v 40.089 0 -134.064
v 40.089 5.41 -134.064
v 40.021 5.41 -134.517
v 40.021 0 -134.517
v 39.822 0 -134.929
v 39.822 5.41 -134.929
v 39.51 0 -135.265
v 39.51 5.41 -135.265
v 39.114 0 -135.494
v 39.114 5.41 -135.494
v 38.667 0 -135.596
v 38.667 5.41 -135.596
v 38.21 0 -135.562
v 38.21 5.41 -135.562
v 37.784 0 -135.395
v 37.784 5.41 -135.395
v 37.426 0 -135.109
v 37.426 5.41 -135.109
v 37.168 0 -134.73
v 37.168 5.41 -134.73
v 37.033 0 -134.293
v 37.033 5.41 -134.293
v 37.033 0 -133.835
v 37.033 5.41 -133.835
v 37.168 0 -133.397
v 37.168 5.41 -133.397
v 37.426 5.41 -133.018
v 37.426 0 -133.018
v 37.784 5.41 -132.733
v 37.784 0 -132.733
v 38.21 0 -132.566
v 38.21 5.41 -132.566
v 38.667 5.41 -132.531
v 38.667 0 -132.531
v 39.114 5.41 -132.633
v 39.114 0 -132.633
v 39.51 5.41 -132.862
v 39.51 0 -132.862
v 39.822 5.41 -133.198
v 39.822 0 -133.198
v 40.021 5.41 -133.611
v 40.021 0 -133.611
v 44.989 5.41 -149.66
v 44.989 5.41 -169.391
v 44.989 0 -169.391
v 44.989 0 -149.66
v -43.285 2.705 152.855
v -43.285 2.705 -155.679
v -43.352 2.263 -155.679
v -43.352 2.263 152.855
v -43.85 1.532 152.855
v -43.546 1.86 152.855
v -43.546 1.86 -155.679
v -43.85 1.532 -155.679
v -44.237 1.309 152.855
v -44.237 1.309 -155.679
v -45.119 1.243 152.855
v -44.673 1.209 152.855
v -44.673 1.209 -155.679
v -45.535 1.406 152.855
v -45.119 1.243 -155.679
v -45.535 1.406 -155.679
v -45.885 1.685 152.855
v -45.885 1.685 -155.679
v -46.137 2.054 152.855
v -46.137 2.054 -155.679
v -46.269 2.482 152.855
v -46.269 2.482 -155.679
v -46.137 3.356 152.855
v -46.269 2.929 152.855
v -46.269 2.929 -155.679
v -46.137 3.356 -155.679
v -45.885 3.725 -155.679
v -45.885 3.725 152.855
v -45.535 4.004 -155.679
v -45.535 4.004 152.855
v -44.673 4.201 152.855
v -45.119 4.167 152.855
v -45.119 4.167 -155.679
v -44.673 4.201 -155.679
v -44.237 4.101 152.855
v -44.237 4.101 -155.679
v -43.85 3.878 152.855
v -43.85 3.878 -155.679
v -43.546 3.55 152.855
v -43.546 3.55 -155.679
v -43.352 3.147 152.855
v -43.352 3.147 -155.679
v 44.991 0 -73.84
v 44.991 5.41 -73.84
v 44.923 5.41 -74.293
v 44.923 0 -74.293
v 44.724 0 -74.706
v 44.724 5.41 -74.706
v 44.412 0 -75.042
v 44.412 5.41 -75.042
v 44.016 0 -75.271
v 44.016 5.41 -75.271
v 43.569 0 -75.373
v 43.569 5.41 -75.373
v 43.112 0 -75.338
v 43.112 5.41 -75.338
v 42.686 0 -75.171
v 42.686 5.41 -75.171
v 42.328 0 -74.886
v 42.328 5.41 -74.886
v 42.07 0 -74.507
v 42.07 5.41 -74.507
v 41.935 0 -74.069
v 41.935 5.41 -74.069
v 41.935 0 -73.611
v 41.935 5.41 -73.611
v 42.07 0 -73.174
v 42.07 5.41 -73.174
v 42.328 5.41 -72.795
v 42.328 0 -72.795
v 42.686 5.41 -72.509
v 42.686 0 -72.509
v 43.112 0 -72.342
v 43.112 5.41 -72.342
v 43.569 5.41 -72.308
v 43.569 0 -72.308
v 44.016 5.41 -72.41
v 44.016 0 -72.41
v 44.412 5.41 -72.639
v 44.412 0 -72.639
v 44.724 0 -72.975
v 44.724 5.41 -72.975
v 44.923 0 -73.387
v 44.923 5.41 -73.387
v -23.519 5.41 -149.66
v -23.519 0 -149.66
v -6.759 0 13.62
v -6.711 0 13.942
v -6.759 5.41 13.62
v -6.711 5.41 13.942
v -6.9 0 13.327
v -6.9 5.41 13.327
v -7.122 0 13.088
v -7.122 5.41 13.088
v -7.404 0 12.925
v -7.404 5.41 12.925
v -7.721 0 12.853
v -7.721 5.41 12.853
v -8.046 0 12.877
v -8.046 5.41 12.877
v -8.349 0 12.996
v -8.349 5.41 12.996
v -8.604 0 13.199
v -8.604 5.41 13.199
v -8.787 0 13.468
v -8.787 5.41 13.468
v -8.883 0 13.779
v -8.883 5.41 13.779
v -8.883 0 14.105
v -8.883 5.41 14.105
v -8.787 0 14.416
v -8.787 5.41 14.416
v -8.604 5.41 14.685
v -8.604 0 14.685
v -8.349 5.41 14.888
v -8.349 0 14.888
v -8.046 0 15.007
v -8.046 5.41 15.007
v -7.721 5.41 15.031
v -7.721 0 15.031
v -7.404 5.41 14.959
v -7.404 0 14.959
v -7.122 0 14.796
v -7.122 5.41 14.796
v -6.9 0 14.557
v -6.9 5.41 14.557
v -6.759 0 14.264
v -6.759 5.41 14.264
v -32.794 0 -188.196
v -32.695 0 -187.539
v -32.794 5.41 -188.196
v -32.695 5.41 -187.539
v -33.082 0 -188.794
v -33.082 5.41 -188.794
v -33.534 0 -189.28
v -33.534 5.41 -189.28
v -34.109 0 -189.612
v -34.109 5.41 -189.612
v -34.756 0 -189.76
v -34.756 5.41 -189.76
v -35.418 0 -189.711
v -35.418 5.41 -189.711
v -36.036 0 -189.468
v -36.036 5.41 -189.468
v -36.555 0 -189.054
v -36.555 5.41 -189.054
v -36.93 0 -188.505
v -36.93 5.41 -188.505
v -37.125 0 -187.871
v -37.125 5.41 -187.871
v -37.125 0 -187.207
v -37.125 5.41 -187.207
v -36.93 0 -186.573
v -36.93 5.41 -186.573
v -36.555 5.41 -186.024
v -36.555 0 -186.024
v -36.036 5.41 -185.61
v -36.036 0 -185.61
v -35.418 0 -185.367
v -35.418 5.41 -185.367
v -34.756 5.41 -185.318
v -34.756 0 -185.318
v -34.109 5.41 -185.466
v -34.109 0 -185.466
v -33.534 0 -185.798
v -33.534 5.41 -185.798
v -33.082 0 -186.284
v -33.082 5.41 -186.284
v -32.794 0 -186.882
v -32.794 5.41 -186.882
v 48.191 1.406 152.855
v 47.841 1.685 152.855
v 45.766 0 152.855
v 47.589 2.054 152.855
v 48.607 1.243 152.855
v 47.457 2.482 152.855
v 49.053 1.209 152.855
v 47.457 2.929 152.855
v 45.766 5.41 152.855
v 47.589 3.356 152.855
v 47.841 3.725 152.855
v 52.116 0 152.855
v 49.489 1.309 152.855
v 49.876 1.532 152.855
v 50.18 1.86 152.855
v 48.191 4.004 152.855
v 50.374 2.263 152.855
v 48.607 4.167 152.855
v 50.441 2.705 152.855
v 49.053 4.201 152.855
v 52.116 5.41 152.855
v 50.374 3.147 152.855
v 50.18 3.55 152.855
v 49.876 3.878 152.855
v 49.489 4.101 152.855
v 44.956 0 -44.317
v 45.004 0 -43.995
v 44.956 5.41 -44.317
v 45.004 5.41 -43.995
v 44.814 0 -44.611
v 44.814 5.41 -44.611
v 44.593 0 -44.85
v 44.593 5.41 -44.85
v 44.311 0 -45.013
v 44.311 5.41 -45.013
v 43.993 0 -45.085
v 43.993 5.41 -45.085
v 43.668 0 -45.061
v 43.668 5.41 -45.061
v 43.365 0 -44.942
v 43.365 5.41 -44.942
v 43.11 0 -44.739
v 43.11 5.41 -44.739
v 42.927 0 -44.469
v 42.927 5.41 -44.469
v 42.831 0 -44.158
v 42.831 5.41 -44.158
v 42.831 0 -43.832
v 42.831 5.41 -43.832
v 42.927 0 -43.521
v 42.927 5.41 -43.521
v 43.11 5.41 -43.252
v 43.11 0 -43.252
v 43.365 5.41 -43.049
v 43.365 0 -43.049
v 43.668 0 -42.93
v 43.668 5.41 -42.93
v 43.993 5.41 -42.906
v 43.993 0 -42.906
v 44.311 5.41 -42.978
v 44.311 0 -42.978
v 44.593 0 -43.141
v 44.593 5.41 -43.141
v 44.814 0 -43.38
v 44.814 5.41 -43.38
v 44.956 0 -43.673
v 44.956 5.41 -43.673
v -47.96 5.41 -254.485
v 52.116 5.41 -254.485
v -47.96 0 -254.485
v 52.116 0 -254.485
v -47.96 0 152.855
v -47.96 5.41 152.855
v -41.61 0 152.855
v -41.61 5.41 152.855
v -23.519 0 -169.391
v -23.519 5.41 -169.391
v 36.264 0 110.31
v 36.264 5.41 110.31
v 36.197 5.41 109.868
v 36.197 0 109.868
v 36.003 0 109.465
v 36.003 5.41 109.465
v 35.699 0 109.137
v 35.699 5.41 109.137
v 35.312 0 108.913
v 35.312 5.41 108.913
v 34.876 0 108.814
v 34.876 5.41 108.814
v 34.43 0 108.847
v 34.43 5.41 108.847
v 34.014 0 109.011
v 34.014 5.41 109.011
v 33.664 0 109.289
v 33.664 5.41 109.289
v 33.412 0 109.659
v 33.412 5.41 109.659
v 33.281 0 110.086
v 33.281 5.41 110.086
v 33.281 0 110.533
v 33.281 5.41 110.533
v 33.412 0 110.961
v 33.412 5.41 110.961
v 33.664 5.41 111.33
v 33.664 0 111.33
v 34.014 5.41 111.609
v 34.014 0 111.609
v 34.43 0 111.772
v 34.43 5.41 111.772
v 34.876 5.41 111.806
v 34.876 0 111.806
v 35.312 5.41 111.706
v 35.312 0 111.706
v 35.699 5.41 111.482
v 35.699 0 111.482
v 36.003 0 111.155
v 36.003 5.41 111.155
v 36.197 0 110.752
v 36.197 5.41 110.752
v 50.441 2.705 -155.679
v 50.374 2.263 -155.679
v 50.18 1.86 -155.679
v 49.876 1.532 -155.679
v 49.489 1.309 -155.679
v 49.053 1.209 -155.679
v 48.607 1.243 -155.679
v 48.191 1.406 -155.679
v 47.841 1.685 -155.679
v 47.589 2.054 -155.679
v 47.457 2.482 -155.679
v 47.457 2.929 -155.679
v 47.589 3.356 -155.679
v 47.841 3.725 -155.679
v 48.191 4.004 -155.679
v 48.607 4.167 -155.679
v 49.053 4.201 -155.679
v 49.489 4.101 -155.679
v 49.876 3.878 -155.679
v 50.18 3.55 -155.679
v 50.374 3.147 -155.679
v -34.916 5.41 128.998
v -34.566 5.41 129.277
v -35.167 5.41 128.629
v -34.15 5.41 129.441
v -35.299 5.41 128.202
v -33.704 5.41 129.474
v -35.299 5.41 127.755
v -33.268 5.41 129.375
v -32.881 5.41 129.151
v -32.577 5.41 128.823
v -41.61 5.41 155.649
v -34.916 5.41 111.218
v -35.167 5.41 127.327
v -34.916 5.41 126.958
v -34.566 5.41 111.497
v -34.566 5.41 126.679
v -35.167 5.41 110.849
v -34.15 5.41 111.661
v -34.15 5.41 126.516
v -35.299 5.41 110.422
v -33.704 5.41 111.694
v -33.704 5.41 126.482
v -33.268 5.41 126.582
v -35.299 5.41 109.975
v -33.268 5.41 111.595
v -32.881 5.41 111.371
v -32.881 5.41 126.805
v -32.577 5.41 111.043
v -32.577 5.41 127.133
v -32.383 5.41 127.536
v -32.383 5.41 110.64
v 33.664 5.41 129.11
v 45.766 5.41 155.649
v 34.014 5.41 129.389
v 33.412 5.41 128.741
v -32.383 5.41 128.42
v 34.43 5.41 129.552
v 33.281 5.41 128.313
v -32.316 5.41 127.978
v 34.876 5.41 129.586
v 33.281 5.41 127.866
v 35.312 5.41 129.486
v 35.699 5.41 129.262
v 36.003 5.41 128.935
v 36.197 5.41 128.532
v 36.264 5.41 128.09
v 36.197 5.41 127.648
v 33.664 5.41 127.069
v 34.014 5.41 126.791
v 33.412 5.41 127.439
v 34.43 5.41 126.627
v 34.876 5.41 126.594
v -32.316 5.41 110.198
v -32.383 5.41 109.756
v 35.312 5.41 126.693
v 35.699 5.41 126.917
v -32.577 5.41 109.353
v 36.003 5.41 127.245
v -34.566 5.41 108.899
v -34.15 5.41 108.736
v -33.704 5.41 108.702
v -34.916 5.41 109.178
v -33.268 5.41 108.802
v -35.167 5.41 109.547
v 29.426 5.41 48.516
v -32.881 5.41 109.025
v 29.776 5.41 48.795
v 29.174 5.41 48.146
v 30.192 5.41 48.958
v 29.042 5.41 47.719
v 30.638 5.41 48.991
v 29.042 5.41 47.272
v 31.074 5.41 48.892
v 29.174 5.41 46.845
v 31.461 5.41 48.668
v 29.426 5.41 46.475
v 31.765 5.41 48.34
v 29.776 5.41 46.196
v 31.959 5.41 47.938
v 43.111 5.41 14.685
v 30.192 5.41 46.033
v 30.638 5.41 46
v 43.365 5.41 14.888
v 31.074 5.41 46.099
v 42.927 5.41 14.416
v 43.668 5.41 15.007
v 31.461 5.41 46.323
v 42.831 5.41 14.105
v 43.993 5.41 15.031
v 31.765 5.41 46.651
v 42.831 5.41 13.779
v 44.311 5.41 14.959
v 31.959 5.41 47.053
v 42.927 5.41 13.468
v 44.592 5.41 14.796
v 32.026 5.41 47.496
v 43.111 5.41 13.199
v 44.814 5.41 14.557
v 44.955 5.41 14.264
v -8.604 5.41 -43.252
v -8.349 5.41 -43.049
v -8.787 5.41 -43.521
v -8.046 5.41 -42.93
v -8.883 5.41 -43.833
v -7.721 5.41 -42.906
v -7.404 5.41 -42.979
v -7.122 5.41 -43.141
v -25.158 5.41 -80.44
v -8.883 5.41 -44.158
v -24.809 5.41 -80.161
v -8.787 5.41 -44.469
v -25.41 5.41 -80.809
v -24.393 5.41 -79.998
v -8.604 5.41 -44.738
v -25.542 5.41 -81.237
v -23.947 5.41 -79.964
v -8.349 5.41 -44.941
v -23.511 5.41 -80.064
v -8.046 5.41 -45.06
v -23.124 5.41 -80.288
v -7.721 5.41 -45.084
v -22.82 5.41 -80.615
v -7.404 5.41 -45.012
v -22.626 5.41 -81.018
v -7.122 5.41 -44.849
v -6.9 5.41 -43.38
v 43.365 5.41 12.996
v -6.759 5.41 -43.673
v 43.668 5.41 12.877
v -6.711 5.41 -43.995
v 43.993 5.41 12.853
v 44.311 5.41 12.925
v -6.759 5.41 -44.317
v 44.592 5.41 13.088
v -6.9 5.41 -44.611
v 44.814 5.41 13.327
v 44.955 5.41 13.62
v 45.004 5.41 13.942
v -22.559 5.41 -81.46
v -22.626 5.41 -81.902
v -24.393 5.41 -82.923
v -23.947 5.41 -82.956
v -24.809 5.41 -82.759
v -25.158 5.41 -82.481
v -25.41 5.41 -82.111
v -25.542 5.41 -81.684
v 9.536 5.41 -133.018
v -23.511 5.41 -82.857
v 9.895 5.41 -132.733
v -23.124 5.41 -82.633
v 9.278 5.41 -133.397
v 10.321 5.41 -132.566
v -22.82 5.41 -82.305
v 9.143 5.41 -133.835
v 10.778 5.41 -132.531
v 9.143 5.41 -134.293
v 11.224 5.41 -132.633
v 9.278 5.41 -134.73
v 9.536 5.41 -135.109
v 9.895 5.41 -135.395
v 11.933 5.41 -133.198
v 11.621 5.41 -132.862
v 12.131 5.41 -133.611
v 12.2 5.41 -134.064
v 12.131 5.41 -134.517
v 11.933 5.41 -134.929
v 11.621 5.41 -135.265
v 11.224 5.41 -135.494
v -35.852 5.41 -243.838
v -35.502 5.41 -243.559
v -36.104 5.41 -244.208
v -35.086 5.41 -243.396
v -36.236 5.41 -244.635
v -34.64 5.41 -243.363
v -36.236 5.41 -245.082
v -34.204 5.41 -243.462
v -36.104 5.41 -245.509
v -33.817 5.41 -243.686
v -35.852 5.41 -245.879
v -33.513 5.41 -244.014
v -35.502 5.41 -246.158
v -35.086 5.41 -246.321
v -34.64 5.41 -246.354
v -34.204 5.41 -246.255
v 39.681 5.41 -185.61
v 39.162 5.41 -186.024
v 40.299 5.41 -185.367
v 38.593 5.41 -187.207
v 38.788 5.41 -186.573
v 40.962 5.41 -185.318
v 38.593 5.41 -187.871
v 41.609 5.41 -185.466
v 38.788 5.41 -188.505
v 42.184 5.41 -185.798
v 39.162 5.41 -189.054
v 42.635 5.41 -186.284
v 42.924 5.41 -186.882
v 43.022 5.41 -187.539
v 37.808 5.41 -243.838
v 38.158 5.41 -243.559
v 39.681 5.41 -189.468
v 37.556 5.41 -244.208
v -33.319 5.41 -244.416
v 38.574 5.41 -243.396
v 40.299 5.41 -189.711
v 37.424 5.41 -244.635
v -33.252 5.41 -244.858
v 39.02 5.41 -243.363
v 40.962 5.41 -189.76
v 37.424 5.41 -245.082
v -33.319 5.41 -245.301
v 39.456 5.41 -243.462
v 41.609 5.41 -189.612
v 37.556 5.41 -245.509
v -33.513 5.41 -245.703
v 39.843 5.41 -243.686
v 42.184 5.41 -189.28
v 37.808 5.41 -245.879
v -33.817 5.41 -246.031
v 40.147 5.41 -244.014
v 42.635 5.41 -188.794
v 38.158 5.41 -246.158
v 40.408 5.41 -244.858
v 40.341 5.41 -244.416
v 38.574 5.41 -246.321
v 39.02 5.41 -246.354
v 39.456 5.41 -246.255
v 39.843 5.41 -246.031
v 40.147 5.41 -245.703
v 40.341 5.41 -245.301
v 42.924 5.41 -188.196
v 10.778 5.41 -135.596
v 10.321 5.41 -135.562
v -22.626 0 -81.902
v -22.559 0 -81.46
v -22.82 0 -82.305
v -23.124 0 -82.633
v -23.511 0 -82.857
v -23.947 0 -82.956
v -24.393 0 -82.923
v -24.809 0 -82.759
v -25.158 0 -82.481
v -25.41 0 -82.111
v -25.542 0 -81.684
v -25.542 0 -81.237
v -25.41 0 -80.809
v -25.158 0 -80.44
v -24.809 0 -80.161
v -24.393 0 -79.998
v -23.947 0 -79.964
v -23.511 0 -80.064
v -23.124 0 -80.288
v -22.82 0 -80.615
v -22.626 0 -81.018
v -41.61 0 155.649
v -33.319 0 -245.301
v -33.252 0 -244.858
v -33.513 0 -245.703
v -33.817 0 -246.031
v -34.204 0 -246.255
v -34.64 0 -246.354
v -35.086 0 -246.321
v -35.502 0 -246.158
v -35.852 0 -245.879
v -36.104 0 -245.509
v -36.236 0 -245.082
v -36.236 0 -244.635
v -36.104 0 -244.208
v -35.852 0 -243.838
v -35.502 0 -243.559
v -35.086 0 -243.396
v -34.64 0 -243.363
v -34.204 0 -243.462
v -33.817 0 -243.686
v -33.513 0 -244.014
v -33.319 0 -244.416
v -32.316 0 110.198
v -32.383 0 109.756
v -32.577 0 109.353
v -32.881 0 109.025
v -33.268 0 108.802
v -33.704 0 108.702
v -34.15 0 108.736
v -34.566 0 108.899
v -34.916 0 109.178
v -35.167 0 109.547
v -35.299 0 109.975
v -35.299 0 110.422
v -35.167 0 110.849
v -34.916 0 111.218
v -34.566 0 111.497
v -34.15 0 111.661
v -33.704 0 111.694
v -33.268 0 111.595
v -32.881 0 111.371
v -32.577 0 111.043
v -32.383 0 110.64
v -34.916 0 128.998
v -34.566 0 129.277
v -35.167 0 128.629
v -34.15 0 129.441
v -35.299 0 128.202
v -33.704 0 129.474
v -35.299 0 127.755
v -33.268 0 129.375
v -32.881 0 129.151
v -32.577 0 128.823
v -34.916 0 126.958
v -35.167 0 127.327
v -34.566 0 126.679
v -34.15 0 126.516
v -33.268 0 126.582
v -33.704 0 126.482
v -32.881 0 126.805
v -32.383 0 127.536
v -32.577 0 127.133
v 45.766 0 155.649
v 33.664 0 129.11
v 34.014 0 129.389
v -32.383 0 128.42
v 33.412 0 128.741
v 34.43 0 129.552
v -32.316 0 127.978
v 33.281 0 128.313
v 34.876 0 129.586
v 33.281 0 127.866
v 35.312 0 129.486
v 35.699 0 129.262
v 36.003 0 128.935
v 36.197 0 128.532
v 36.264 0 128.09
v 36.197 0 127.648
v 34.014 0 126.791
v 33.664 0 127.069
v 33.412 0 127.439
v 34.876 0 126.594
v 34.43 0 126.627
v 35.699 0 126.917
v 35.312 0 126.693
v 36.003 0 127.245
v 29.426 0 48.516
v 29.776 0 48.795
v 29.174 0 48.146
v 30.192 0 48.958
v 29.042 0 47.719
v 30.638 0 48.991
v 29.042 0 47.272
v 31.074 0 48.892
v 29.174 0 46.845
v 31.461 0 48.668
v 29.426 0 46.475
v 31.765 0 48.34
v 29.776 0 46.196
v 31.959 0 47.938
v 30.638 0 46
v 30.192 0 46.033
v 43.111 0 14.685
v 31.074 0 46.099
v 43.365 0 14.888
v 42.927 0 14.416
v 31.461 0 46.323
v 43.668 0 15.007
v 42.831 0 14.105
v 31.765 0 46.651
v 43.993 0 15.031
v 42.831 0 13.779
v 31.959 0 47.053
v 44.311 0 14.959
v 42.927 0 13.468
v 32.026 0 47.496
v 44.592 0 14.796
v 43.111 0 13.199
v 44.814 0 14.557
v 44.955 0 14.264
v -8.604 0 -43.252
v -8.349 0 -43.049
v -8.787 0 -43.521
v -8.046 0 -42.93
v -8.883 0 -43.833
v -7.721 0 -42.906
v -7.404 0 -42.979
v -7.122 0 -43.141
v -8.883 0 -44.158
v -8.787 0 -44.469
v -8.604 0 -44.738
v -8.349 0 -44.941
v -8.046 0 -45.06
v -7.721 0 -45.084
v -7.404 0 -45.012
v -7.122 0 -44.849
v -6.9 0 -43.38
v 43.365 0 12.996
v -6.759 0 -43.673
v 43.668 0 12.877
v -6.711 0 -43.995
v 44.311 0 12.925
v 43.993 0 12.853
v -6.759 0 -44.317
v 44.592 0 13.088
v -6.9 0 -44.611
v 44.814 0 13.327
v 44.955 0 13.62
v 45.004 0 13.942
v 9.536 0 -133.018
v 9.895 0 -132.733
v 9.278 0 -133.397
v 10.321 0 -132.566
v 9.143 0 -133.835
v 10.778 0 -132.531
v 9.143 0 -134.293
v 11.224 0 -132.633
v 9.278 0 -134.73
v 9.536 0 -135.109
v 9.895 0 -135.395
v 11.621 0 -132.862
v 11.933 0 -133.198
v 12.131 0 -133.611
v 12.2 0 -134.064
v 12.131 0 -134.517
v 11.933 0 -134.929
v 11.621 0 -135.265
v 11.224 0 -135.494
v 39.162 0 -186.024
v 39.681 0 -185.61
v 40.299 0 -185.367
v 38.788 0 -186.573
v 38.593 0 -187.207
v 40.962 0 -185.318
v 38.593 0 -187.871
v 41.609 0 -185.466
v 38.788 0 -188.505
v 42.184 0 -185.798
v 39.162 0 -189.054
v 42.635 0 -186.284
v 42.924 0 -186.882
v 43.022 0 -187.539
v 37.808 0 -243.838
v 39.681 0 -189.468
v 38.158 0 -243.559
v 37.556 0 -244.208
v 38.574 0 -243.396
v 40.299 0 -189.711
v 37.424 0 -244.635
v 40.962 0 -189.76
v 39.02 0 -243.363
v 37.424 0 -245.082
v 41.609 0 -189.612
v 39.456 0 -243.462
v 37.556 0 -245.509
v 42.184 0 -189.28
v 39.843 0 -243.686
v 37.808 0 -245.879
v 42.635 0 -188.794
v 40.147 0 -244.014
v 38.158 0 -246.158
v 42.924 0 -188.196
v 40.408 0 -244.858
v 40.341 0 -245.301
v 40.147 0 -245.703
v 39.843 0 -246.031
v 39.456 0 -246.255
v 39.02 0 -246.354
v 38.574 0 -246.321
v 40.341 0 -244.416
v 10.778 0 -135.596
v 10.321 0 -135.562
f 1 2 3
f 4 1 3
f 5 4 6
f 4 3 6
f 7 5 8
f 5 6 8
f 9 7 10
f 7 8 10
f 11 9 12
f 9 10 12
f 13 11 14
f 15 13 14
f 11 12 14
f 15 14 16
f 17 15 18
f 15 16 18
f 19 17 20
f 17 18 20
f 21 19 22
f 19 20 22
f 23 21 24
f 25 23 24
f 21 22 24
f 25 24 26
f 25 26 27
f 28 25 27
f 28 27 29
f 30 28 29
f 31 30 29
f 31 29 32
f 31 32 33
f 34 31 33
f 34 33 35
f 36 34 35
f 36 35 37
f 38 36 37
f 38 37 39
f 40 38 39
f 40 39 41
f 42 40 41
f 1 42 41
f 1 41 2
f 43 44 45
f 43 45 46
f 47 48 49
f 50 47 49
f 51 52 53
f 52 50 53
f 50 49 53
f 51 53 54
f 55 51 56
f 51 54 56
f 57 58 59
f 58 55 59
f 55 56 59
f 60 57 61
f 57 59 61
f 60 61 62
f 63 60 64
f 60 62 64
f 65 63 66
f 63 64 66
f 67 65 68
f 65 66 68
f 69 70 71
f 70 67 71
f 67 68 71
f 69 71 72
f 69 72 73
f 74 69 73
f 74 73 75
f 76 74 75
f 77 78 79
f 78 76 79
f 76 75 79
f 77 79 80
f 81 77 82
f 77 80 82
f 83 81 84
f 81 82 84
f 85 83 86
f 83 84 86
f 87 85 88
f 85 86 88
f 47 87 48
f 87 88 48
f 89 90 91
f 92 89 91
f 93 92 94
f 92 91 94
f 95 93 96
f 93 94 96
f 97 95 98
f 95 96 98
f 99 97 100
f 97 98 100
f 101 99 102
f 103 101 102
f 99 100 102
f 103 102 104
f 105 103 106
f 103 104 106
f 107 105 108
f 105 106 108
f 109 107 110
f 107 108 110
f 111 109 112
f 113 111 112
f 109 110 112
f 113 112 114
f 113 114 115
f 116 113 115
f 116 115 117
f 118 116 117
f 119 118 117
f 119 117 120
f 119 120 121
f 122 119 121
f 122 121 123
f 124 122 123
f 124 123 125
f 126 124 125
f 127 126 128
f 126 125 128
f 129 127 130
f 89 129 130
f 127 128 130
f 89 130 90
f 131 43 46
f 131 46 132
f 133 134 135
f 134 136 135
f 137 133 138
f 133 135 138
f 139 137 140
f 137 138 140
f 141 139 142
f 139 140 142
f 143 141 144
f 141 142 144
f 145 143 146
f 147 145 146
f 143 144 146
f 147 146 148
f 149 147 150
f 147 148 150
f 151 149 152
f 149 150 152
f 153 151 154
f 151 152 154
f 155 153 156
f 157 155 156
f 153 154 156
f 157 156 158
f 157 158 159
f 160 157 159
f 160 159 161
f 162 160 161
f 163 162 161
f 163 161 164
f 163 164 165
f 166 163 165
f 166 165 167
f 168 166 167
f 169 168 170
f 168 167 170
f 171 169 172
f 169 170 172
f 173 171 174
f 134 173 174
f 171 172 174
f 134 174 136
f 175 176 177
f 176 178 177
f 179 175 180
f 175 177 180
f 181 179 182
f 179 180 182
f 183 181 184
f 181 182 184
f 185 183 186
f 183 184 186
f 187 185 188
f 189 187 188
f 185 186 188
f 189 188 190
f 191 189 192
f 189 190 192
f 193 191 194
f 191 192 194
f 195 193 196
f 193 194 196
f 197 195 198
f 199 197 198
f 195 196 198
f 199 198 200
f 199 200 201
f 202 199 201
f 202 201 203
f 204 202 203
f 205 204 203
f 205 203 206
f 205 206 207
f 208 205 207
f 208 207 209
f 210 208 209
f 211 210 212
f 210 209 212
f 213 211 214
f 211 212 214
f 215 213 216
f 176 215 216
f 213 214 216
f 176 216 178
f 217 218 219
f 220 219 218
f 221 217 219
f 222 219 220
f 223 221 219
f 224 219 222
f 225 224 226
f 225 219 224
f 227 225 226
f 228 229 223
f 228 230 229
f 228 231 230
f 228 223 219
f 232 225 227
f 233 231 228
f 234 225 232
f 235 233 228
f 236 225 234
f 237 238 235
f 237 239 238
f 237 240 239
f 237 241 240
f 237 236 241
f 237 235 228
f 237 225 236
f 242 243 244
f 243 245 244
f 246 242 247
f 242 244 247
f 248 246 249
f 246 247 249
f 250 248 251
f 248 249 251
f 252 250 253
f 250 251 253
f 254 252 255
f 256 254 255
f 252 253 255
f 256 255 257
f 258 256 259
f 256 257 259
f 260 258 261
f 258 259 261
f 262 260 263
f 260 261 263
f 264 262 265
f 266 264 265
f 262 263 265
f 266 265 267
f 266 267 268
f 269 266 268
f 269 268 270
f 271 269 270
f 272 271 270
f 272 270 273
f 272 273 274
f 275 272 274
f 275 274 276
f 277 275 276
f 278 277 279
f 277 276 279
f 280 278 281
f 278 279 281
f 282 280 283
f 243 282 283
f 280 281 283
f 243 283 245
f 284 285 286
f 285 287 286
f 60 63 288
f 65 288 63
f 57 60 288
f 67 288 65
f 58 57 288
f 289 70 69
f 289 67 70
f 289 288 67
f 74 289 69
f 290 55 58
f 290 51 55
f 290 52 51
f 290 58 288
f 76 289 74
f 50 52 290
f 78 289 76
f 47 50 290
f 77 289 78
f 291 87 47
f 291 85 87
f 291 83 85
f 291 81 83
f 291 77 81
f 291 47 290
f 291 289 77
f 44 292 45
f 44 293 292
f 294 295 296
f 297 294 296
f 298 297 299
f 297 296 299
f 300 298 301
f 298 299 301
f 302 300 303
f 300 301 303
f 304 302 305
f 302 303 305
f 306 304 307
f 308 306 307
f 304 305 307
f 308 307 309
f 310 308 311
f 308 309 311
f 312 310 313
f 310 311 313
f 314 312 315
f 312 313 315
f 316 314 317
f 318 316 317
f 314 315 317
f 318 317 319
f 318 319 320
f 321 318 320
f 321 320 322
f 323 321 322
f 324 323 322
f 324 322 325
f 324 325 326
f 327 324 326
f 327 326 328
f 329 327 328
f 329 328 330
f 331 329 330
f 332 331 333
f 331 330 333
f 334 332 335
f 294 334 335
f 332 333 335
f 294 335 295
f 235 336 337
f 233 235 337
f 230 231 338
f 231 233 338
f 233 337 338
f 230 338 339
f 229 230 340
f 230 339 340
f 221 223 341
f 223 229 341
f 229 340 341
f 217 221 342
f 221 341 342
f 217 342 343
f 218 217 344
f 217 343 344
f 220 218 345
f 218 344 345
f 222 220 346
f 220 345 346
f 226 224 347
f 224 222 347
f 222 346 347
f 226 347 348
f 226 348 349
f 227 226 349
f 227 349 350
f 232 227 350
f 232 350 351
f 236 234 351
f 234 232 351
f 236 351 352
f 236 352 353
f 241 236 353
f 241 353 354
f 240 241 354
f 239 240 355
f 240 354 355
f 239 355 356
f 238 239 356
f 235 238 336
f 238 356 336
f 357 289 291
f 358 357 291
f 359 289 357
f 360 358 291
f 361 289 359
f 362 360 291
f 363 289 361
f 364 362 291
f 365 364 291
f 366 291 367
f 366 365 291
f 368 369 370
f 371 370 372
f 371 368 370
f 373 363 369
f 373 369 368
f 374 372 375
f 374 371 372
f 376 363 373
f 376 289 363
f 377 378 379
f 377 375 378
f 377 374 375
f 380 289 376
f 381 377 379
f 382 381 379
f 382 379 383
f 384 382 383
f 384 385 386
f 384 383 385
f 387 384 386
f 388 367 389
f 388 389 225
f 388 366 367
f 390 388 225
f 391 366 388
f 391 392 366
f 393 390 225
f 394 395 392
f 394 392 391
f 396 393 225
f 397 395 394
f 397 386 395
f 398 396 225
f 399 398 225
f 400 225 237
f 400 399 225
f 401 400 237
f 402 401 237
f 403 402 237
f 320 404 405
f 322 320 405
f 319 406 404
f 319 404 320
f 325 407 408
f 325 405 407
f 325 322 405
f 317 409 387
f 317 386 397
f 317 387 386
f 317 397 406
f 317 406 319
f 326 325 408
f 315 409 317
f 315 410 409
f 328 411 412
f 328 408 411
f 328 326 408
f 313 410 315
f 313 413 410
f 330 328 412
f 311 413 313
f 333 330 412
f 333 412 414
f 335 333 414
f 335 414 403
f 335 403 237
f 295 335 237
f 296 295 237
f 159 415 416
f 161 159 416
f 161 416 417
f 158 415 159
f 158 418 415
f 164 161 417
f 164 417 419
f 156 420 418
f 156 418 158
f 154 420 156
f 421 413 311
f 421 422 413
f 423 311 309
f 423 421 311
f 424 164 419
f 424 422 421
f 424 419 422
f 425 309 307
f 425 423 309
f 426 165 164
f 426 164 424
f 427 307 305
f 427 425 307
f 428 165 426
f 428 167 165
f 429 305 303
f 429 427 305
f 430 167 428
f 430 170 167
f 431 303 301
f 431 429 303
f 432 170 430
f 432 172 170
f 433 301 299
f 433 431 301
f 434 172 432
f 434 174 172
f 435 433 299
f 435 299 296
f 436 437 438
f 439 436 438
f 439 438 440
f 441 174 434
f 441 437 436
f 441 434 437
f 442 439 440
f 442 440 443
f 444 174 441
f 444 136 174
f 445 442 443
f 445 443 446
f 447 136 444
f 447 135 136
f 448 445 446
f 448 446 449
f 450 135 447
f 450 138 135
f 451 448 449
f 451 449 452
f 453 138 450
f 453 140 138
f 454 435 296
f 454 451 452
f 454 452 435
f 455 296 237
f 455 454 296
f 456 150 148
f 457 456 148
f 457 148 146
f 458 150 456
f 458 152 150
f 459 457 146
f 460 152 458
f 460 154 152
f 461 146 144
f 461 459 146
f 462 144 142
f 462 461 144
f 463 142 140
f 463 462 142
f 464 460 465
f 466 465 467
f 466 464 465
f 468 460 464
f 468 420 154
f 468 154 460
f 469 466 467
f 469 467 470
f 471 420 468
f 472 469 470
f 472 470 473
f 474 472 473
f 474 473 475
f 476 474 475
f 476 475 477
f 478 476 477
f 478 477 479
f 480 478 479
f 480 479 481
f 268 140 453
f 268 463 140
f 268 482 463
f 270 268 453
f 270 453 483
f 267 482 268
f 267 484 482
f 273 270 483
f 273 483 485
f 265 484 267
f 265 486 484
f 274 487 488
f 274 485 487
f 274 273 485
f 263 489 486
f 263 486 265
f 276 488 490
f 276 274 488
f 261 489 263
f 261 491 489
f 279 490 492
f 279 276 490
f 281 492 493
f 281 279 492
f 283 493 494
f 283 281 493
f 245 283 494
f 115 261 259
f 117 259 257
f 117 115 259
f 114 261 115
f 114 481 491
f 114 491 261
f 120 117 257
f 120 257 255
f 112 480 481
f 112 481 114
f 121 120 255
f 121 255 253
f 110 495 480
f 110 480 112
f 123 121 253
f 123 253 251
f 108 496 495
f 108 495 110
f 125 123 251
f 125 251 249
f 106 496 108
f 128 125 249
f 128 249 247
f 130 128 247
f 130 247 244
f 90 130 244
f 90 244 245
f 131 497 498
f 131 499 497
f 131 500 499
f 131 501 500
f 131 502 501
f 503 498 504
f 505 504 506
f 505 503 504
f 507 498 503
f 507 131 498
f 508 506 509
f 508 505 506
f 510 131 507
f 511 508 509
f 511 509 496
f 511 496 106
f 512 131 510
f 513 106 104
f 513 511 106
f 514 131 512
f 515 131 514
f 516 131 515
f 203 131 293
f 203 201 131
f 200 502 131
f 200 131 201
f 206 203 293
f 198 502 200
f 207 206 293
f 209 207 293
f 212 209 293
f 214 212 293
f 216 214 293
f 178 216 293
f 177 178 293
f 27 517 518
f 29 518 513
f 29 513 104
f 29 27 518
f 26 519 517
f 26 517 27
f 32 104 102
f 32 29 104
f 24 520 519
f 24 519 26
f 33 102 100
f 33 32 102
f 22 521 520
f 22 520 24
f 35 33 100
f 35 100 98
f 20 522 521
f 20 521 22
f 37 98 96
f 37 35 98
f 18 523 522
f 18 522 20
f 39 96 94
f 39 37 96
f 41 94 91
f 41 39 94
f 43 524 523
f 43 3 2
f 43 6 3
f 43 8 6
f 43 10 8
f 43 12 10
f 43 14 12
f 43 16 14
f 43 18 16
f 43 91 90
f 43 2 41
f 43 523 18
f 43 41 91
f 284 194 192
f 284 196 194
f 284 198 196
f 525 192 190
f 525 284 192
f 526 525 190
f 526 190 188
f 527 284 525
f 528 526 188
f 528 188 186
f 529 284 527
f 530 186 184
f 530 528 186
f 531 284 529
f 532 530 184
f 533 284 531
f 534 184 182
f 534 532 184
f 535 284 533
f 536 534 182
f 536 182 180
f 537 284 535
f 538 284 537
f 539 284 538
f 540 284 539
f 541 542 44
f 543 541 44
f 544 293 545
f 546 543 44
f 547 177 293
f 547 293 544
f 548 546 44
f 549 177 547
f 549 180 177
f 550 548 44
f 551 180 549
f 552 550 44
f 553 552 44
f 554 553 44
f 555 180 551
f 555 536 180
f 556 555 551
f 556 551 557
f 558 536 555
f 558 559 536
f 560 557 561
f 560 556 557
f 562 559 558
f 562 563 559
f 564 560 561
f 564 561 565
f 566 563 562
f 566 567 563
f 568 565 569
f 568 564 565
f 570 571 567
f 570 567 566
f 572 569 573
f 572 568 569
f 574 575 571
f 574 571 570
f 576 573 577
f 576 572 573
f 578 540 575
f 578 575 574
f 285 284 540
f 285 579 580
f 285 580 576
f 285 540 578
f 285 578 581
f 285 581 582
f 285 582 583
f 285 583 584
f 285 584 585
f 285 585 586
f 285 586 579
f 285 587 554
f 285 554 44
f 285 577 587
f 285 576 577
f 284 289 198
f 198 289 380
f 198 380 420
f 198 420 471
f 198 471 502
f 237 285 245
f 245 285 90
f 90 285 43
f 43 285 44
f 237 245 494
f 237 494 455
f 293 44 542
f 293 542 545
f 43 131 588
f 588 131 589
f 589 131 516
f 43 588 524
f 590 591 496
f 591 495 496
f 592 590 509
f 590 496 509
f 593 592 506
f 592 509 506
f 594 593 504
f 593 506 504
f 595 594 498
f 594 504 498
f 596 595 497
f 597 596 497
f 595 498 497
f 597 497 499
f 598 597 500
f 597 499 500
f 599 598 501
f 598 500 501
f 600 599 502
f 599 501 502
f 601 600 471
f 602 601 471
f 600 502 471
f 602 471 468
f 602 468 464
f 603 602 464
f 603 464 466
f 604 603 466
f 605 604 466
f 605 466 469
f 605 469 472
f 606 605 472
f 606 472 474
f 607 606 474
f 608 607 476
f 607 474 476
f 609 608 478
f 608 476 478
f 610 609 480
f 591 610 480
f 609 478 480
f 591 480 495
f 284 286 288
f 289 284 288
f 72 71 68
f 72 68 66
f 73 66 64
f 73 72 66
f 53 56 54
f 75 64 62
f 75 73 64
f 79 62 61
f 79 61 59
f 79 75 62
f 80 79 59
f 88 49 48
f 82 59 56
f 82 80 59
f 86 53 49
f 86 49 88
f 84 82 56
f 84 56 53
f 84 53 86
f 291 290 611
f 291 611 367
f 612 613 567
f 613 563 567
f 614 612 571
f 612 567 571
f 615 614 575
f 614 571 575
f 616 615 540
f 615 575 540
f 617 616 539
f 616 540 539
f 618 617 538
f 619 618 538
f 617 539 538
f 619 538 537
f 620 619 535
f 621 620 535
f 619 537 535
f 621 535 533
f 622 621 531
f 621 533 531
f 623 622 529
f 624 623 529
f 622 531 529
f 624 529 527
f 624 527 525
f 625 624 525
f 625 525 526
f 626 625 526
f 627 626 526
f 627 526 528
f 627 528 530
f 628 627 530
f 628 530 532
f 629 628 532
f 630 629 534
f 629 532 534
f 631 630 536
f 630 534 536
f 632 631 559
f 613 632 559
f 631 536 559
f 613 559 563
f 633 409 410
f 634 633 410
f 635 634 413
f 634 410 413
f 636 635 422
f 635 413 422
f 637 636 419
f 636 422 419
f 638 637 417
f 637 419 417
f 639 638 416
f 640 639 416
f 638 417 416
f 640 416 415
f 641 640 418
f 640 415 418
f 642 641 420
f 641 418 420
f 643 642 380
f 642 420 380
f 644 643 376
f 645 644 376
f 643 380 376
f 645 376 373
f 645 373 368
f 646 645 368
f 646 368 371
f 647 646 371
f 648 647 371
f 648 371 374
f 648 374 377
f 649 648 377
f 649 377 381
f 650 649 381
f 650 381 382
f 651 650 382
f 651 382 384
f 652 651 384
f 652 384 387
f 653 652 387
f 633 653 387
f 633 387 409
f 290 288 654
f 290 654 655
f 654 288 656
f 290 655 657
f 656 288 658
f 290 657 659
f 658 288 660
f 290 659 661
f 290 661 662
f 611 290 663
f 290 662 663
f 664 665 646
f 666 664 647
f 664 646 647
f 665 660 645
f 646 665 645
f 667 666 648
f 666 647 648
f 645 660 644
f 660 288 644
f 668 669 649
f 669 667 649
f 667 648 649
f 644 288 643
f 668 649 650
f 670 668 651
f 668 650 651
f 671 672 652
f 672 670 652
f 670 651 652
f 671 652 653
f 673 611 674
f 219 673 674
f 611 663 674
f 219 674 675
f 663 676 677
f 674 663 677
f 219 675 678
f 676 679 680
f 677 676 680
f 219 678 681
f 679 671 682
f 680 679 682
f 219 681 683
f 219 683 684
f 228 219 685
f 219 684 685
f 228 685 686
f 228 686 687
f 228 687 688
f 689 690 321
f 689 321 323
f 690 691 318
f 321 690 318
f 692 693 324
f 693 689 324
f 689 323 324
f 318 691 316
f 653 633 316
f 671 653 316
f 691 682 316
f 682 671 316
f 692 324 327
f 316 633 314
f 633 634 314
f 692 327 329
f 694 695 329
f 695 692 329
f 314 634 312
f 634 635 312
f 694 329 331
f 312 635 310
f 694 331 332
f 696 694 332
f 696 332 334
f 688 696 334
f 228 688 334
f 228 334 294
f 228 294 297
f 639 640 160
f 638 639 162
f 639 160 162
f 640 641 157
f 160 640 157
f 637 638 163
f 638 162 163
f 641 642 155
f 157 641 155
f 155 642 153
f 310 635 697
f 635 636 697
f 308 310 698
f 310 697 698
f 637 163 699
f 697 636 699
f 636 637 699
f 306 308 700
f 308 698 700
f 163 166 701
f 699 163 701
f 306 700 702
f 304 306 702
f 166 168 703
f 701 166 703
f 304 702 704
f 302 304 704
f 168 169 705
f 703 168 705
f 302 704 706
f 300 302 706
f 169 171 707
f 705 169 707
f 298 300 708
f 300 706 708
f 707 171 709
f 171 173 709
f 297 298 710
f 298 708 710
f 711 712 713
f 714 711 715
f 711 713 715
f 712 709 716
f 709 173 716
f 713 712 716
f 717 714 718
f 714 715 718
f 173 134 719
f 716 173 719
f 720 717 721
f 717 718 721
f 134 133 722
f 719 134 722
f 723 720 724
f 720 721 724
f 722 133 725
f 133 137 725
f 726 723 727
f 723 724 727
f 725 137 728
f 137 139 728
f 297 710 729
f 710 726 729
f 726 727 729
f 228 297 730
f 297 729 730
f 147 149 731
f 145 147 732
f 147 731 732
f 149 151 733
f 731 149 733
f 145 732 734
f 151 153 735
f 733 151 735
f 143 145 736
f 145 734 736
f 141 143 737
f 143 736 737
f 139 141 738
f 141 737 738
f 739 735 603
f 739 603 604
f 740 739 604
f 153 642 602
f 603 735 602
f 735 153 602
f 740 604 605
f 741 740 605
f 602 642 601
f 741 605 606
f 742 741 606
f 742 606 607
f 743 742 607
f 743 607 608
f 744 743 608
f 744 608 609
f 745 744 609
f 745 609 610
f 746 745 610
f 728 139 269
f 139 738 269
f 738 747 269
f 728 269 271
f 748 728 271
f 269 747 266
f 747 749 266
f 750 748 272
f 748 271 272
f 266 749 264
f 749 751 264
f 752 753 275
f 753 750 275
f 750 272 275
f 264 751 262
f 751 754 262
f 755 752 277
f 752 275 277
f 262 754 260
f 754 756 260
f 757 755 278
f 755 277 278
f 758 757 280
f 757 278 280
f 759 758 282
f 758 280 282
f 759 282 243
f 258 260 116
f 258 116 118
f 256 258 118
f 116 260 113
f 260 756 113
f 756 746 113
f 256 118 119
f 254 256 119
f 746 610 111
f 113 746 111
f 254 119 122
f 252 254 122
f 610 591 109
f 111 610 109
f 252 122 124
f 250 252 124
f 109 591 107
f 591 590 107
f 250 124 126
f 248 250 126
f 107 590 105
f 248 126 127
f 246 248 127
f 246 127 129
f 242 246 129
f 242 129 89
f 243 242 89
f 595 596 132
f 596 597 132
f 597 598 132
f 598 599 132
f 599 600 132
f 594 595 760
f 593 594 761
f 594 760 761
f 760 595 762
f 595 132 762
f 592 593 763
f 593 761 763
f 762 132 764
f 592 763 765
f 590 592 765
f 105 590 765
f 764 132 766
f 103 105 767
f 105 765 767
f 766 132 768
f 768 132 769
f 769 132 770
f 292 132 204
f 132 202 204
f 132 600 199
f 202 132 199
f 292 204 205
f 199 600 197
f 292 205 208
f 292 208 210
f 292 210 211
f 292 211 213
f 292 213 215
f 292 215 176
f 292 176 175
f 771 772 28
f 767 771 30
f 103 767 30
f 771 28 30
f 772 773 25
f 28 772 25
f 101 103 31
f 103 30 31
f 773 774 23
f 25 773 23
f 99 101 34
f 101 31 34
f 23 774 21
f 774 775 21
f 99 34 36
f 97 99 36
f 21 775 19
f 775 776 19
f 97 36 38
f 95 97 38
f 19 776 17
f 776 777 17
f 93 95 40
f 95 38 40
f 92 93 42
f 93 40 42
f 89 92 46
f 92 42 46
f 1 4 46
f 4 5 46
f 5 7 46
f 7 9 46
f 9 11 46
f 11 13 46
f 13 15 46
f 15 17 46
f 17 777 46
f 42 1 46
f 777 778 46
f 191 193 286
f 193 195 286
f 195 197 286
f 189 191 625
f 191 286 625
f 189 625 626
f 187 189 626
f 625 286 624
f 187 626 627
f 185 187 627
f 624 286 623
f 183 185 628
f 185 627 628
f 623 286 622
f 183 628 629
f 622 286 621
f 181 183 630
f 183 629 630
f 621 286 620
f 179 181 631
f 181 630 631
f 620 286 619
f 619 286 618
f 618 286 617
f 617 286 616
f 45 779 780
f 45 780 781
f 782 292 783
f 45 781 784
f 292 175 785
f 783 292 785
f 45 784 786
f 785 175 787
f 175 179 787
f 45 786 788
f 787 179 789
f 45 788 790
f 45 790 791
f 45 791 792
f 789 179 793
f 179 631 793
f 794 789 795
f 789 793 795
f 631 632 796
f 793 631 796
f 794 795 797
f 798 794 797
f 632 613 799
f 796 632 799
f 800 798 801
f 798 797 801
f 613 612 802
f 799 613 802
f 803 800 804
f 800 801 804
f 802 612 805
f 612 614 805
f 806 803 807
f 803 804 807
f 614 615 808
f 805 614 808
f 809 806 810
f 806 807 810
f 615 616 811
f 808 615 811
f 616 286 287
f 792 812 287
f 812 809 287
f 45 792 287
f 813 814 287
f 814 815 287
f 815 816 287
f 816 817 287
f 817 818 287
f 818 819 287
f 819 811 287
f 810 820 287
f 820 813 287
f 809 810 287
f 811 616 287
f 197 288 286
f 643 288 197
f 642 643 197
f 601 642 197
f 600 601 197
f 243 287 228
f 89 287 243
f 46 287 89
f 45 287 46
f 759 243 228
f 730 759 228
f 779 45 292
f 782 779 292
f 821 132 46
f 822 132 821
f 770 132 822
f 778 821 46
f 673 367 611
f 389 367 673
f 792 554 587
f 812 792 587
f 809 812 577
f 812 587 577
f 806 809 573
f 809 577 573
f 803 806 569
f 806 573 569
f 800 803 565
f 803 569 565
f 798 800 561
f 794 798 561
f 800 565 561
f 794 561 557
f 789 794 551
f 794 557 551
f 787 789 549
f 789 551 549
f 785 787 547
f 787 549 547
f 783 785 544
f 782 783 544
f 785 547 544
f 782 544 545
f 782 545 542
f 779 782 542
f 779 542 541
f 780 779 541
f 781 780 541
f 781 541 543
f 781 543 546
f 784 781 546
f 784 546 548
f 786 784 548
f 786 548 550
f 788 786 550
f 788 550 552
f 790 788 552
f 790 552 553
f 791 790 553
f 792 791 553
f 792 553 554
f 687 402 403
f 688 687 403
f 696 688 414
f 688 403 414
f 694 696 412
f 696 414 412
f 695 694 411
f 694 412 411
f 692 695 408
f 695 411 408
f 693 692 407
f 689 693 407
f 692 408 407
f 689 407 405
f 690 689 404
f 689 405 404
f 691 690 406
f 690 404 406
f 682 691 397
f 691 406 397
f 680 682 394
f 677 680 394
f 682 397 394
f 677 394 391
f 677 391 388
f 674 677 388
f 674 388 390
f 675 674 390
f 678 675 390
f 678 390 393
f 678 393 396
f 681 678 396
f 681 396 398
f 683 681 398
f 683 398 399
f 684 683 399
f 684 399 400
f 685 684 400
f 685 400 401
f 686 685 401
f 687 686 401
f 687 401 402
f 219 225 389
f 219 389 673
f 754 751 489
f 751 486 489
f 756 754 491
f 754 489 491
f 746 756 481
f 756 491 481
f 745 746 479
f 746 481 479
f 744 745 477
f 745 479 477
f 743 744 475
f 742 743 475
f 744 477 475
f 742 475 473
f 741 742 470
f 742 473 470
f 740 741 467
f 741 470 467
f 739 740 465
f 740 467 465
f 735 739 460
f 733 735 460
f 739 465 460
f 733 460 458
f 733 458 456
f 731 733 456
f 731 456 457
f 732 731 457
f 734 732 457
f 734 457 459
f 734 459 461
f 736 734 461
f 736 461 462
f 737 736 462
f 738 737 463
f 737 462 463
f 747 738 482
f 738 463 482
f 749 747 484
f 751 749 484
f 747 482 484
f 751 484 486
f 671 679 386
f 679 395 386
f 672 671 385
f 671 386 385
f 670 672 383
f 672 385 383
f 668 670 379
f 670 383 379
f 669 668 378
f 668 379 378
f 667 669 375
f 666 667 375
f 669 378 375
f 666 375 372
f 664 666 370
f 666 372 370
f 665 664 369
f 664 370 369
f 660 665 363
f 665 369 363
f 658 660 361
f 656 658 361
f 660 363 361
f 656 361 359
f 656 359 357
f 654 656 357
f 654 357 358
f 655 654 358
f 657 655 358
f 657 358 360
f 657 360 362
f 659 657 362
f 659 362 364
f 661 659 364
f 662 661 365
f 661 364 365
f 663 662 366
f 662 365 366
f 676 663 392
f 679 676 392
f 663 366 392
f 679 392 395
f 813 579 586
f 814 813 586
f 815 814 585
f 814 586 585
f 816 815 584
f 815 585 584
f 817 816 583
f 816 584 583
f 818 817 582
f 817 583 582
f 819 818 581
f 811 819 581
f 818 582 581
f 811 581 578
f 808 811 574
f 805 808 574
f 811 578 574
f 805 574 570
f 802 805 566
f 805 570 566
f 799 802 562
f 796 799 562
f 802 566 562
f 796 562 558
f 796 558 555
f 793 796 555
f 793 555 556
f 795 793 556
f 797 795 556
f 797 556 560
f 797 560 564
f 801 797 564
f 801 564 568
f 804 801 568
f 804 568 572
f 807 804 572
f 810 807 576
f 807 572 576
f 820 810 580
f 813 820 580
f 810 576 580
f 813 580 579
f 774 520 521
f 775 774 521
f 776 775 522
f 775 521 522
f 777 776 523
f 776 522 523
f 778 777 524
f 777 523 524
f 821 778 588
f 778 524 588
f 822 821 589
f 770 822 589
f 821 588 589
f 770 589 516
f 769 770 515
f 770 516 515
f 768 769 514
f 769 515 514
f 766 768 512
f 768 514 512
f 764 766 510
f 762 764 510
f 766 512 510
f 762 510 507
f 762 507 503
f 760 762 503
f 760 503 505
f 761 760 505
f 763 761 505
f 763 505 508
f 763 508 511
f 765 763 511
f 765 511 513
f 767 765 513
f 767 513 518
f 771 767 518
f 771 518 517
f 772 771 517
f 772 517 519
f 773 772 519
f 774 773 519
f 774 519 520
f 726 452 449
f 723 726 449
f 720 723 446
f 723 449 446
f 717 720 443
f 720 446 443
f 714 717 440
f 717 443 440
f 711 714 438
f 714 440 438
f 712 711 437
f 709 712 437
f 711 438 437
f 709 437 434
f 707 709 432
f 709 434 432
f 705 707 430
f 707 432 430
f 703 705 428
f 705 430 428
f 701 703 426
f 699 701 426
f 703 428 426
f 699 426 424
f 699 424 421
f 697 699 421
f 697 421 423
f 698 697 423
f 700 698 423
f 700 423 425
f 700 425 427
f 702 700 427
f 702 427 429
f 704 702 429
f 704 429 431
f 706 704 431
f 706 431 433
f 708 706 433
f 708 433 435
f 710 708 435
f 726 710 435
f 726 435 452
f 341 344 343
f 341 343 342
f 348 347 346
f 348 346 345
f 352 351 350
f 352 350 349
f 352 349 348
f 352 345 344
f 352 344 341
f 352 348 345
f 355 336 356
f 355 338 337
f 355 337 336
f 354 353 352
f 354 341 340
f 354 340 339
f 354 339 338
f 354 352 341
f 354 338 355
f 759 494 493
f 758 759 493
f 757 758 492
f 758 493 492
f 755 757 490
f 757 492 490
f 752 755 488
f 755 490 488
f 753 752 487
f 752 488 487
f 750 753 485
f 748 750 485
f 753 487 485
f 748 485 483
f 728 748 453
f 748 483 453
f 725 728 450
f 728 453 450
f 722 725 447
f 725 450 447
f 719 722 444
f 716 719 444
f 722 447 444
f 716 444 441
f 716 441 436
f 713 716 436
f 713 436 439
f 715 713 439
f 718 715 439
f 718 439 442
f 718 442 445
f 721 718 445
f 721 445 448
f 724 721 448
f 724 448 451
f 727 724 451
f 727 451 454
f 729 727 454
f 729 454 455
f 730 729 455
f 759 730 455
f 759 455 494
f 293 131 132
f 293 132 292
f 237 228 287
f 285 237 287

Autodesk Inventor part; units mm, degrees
ref_plane "YZ Plane" through (0, 0, 0) normal (1, 0, 0) x (0, 1, 0)
ref_plane "XZ Plane" through (0, 0, 0) normal (0, 1, 0) x (-1, 0, 0)
ref_plane "XY Plane" through (0, 0, 0) normal (0, 0, 1) x (1, 0, 0)
sketch "Sketch1" plane through (0, 0, 0) normal (0, 1, 0) x (-1, 0, 0)
  line L0 (47.9603, 101.1149) -> (-52.1157, 101.1149)
  line L1 (-52.1157, 101.1149) -> (-52.1157, -254.4851)
  line L2 (-52.1157, -254.4851) -> (47.9603, -254.4851)
  line L3 (47.9603, -254.4851) -> (47.9603, 101.1149)
  point P0 (0, 0)
  dimension "d0" = 100.076
  dimension "d1" = 355.6
extrude "Extrusion1" add sketch "Sketch1" along normal blind 5.4102
sketch "Sketch5" plane through (0, 5.4102, 0) normal (0, 1, 0) x (1, 0, 0)
  circle A0 centre (-34.7523, 244.8585) radius 1.5
  circle A1 centre (38.9077, 244.8585) radius 1.5
  line L0 (-34.7355, 243.3586) -> (38.8909, 243.3586)
  line L1 (52.1157, 254.4851) -> (-47.9603, 254.4851) projected
  point P0 (0, 0)
  point P1 (2.0777, 243.3586)
  point P2 (2.0777, 254.4851)
  dimension "d8" = 3
  dimension "d9" = 3
  dimension "d10" = 73.66
  dimension "d11" = 9.6266
extrude "Extrusion3" cut sketch "Sketch5" against normal blind 25.4
sketch "Sketch6" plane through (0, 5.4102, 0) normal (0, 1, 0) x (1, 0, 0)
  line L0 (-47.9603, -101.1149) -> (52.1157, -101.1149) projected
  line L1 (-47.9603, -101.1149) -> (-41.6103, -101.1149)
  line L2 (-41.6103, -101.1149) -> (-41.6103, -98.3209)
  line L3 (-41.6103, -98.3209) -> (-47.9603, -98.3209)
  line L4 (-47.9603, -98.3209) -> (-47.9603, -101.1149)
  line L5 (52.1157, -101.1149) -> (45.7657, -101.1149)
  line L6 (45.7657, -101.1149) -> (45.7657, -98.3209)
  line L7 (45.7657, -98.3209) -> (52.1157, -98.3209)
  line L8 (52.1157, -98.3209) -> (52.1157, -101.1149)
  point P0 (0, 0)
  dimension "d14" = 2.794
  dimension "d15" = 6.35
  dimension "d16" = 6.35
extrude "Extrusion4" cut sketch "Sketch6" against normal blind 25.4
sketch "Sketch7" plane through (45.7657, 5.4102, 98.3209) normal (0, 0, 1) x (1, 0, 0)
  circle A0 centre (3.175, -2.7051) radius 1.5
  line L0 (0, 0) -> (6.35, 0) projected
  line L1 (6.35, 0) -> (6.35, -5.4102) projected
  circle A1 centre (-90.551, -2.7051) radius 1.5
  line L2 (-93.726, 0) -> (-87.376, 0) projected
  line L3 (-93.726, -5.4102) -> (-93.726, 0) projected
  point P0 (-45.7657, -5.4102)
  point P1 (3.175, 0)
  point P2 (6.35, -2.7051)
  point P3 (-90.551, 0)
  point P4 (-93.726, -2.7051)
  dimension "d19" = 3
  dimension "d20" = 3
extrude "Extrusion5" cut sketch "Sketch7" against normal blind 254
sketch "Sketch8" plane through (-41.6103, 0, 101.1149) normal (0, 0, 1) x (1, 0, 0)
  line L0 (0, 5.4102) -> (87.376, 5.4102) projected
  line L1 (0, 0) -> (87.376, 0) projected
  line L2 (0, 5.4102) -> (87.376, 5.4102)
  line L3 (87.376, 5.4102) -> (87.376, 0)
  line L4 (87.376, 0) -> (0, 0)
  line L5 (0, 0) -> (0, 5.4102)
  point P0 (41.6103, 0)
extrude "Extrusion6" add sketch "Sketch8" along normal blind 54.5338
sketch "Sketch9" plane through (-47.9603, 5.4102, 98.3209) normal (0, 0, 1) x (1, 0, 0)
  line L0 (6.35, 0) -> (6.35, -5.4102) projected
  line L1 (0, 0) -> (6.35, 0)
  line L2 (6.35, 0) -> (6.35, -5.4102)
  line L3 (6.35, -5.4102) -> (0, -5.4102)
  line L4 (0, -5.4102) -> (0, 0)
  line L5 (100.076, 0) -> (100.076, -5.4102) projected
  line L6 (100.076, -5.4102) -> (93.726, -5.4102) projected
  line L7 (100.076, 0) -> (93.726, 0)
  line L8 (93.726, 0) -> (93.726, -5.4102)
  line L9 (93.726, -5.4102) -> (100.076, -5.4102)
  line L10 (100.076, -5.4102) -> (100.076, 0)
  circle A0 centre (96.901, -2.7051) radius 1.5
  circle A1 centre (3.175, -2.7051) radius 1.5
  point P0 (47.9603, -5.4102)
extrude "Extrusion7" add sketch "Sketch9" along normal blind 54.5338
sketch "Sketch10" plane through (0, 5.4102, 0) normal (0, 1, 0) x (1, 0, 0)
  line L0 (-37.6261, -131.8997) -> (38.5739, -131.8997) construction
  line L1 (-37.6261, -106.4997) -> (38.5739, -106.4997) construction
  line L2 (-47.9603, 254.4851) -> (-47.9603, -152.8547) construction
  line L3 (52.1157, -152.8547) -> (52.1157, 254.4851) construction
  line L4 (45.7657, -155.6487) -> (-41.6103, -155.6487) construction
  line L5 (-37.6261, -114.1197) -> (-12.2261, -114.1197) construction
  line L6 (-12.2261, -114.1197) -> (-12.2261, -124.2797) construction
  line L7 (-12.2261, -124.2797) -> (-37.6261, -124.2797) construction
  line L8 (-37.6261, -131.8997) -> (-37.6261, -124.2797) construction
  line L9 (-37.6261, -114.1197) -> (-37.6261, -106.4997) construction
  line L10 (38.5739, -114.1197) -> (13.1739, -114.1197) construction
  line L11 (13.1739, -114.1197) -> (13.1739, -124.2797) construction
  line L12 (13.1739, -124.2797) -> (38.5739, -124.2797) construction
  line L13 (38.5739, -131.8997) -> (38.5739, -124.2797) construction
  line L14 (38.5739, -114.1197) -> (38.5739, -106.4997) construction
  circle A0 centre (34.7639, -110.3097) radius 1.5
  circle A1 centre (34.7639, -128.0897) radius 1.5
  circle A2 centre (-33.816, -127.9782) radius 1.5
  circle A3 centre (-33.816, -110.1982) radius 1.5
  point P0 (0, 0)
  point P1 (38.5739, -110.3097)
  dimension "d27" = 76.2
  dimension "d28" = 25.4
  dimension "d31" = 23.749
  dimension "d32" = 7.62
  dimension "d33" = 7.62
  dimension "d34" = 25.4
  dimension "d35" = 25.4
  dimension "d36" = 68.58
  dimension "d37" = 17.78
  dimension "d38" = 17.78
  dimension "d39" = 68.58
  dimension "d40" = 3
  dimension "d41" = 3
  dimension "d42" = 3
  dimension "d43" = 3
  dimension "d44" = 3.81
  dimension "d45" = 25.4
  dimension "d46" = 25.4
  dimension "d47" = 7.62
  dimension "d48" = 7.62
  dimension "d49" = 7.62
  dimension "d50" = 7.62
  dimension "d51" = 76.2
  dimension "d52" = 25.4
  dimension "d53" = 25.4
  dimension "d54" = 17.78
extrude "Extrusion8" cut sketch "Sketch10" against normal blind 54.5338
sketch "Sketch11" plane through (0, 5.4102, 0) normal (0, 1, 0) x (1, 0, 0)
  line L0 (-41.6103, -155.6487) -> (45.7657, -155.6487) construction
  line L1 (43.9115, -155.6487) -> (43.9115, -13.9421) construction
  line L2 (43.9115, -13.9421) -> (52.1157, -13.9421) construction
  line L3 (52.1157, -152.8547) -> (52.1157, 254.4851) construction
  circle A0 centre (43.9115, -13.9421) radius 1.0922
  circle A1 centre (-7.8029, -13.9421) radius 1.0922
  circle A2 centre (43.9115, 43.9953) radius 1.0928
  circle A3 centre (-7.8029, 43.9953) radius 1.0922
  point P0 (0, 0)
  dimension "d57" = 141.7066
  dimension "d58" = 8.2042
  dimension "d59" = 2.1844
  dimension "d60" = 2.1844
  dimension "d62" = 51.7144
  dimension "d63" = 57.9374
  dimension "d64" = 57.9374
extrude "Extrusion9" cut sketch "Sketch11" against normal blind 54.5338
sketch "Sketch12" plane through (0, 5.4102, 0) normal (0, 1, 0) x (1, 0, 0)
  circle A0 centre (43.4543, 73.8403) radius 1.5367
  line L0 (52.1157, -152.8547) -> (52.1157, 254.4851) projected
  line L1 (52.1157, -152.8547) -> (45.7657, -152.8547) projected
  line L2 (46.0959, 58.6257) -> (46.0959, 133.7589) construction
  line L3 (46.0959, 58.6257) -> (-7.3203, 58.6257) construction
  line L4 (46.0959, 133.7589) -> (44.0639, 133.7589) construction
  line L5 (44.0639, 133.7589) -> (44.0639, 136.7053) construction
  line L6 (44.0639, 136.7053) -> (6.6751, 136.7053) construction
  line L7 (6.6751, 136.7053) -> (6.6751, 133.7589) construction
  line L8 (6.6751, 133.7589) -> (-7.2949, 133.7589) construction
  line L9 (-7.3203, 58.6257) -> (-7.2949, 133.7589) construction
  circle A1 centre (38.5521, 134.0637) radius 1.5367
  circle A2 centre (10.6629, 134.0637) radius 1.5367
  point P0 (0, 0)
  dimension "d67" = 3.0734
  dimension "d68" = 8.6614
  dimension "d69" = 226.695
  dimension "d89" = 15.2146
  dimension "d90" = 2.6416
  dimension "d91" = 75.1332
  dimension "d92" = 53.4162
  dimension "d93" = 2.032
  dimension "d94" = 2.9464
  dimension "d95" = 37.3888
  dimension "d96" = 13.97
  dimension "d97" = 75.1332
  dimension "d98" = 3.0734
  dimension "d99" = 2.6416
  dimension "d100" = 3.0734
  dimension "d101" = 2.6416
  dimension "d102" = 27.8892
  dimension "d103" = 7.5438
  dimension "d104" = 60.4226
extrude "Extrusion10" cut sketch "Sketch12" against normal blind 25.4
sketch "Sketch13" plane through (0, 5.4102, 0) normal (0, 1, 0) x (1, 0, 0)
  line L0 (44.9886, 149.6605) -> (-23.5191, 149.6605)
  line L1 (-23.5191, 149.6605) -> (-23.5191, 169.3907)
  line L2 (-23.5191, 169.3907) -> (44.9886, 169.3907)
  line L3 (44.9886, 169.3907) -> (44.9886, 149.6605)
  point P0 (0, 0)
extrude "Extrusion11" cut sketch "Sketch13" against normal blind 25.4
sketch "Sketch14" plane through (0, 5.4102, 0) normal (0, 1, 0) x (1, 0, 0)
  line L0 (-39.2837, 182.0907) -> (45.1561, 182.0907) construction
  line L1 (45.1561, 182.0907) -> (45.1561, 192.9873) construction
  line L2 (45.1561, 192.9873) -> (-39.2837, 192.9873) construction
  line L3 (-39.2837, 192.9873) -> (-39.2837, 182.0907) construction
  line L4 (-23.5191, 169.3907) -> (44.9886, 169.3907) construction
  circle A0 centre (40.7951, 187.539) radius 2.2274
  circle A1 centre (-34.9227, 187.539) radius 2.2274
  line L5 (-47.9603, 254.4851) -> (-47.9603, -152.8547) construction
  line L6 (52.1157, -152.8547) -> (52.1157, 254.4851) construction
  point P0 (0, 0)
  dimension "d107" = 84.4398
  dimension "d108" = 10.8966
  dimension "d109" = 12.7
  dimension "d110" = 2.1336
  dimension "d111" = 2.1336
  dimension "d114" = 6.9596
extrude "Extrusion12" cut sketch "Sketch14" against normal blind 25.4
sketch "Sketch15" plane through (0, 5.4102, 0) normal (0, 1, 0) x (1, 0, 0)
  circle A0 centre (30.5257, -47.4955) radius 1.5
  line L0 (-47.9603, 254.4851) -> (-47.9603, -152.8547) projected
  line L1 (-41.6103, -152.8547) -> (-47.9603, -152.8547) projected
  line L2 (52.1157, -152.8547) -> (52.1157, 254.4851) projected
  circle A1 centre (-24.0589, 81.4603) radius 1.5
  point P0 (0, 0)
  dimension "d117" = 3
  dimension "d119" = 105.3592
  dimension "d120" = 21.59
  dimension "d121" = 3
  dimension "d122" = 23.9014
  dimension "d123" = 234.315
extrude "Extrusion13" cut sketch "Sketch15" against normal blind 25.4
equation "\"d9\" = d8"
equation "\"d20\" = d19"
equation "\"d60\" = d59"
equation "\"d111\" = d110"
equation "\"d121\" = d117"
properties part number "Control Board"
